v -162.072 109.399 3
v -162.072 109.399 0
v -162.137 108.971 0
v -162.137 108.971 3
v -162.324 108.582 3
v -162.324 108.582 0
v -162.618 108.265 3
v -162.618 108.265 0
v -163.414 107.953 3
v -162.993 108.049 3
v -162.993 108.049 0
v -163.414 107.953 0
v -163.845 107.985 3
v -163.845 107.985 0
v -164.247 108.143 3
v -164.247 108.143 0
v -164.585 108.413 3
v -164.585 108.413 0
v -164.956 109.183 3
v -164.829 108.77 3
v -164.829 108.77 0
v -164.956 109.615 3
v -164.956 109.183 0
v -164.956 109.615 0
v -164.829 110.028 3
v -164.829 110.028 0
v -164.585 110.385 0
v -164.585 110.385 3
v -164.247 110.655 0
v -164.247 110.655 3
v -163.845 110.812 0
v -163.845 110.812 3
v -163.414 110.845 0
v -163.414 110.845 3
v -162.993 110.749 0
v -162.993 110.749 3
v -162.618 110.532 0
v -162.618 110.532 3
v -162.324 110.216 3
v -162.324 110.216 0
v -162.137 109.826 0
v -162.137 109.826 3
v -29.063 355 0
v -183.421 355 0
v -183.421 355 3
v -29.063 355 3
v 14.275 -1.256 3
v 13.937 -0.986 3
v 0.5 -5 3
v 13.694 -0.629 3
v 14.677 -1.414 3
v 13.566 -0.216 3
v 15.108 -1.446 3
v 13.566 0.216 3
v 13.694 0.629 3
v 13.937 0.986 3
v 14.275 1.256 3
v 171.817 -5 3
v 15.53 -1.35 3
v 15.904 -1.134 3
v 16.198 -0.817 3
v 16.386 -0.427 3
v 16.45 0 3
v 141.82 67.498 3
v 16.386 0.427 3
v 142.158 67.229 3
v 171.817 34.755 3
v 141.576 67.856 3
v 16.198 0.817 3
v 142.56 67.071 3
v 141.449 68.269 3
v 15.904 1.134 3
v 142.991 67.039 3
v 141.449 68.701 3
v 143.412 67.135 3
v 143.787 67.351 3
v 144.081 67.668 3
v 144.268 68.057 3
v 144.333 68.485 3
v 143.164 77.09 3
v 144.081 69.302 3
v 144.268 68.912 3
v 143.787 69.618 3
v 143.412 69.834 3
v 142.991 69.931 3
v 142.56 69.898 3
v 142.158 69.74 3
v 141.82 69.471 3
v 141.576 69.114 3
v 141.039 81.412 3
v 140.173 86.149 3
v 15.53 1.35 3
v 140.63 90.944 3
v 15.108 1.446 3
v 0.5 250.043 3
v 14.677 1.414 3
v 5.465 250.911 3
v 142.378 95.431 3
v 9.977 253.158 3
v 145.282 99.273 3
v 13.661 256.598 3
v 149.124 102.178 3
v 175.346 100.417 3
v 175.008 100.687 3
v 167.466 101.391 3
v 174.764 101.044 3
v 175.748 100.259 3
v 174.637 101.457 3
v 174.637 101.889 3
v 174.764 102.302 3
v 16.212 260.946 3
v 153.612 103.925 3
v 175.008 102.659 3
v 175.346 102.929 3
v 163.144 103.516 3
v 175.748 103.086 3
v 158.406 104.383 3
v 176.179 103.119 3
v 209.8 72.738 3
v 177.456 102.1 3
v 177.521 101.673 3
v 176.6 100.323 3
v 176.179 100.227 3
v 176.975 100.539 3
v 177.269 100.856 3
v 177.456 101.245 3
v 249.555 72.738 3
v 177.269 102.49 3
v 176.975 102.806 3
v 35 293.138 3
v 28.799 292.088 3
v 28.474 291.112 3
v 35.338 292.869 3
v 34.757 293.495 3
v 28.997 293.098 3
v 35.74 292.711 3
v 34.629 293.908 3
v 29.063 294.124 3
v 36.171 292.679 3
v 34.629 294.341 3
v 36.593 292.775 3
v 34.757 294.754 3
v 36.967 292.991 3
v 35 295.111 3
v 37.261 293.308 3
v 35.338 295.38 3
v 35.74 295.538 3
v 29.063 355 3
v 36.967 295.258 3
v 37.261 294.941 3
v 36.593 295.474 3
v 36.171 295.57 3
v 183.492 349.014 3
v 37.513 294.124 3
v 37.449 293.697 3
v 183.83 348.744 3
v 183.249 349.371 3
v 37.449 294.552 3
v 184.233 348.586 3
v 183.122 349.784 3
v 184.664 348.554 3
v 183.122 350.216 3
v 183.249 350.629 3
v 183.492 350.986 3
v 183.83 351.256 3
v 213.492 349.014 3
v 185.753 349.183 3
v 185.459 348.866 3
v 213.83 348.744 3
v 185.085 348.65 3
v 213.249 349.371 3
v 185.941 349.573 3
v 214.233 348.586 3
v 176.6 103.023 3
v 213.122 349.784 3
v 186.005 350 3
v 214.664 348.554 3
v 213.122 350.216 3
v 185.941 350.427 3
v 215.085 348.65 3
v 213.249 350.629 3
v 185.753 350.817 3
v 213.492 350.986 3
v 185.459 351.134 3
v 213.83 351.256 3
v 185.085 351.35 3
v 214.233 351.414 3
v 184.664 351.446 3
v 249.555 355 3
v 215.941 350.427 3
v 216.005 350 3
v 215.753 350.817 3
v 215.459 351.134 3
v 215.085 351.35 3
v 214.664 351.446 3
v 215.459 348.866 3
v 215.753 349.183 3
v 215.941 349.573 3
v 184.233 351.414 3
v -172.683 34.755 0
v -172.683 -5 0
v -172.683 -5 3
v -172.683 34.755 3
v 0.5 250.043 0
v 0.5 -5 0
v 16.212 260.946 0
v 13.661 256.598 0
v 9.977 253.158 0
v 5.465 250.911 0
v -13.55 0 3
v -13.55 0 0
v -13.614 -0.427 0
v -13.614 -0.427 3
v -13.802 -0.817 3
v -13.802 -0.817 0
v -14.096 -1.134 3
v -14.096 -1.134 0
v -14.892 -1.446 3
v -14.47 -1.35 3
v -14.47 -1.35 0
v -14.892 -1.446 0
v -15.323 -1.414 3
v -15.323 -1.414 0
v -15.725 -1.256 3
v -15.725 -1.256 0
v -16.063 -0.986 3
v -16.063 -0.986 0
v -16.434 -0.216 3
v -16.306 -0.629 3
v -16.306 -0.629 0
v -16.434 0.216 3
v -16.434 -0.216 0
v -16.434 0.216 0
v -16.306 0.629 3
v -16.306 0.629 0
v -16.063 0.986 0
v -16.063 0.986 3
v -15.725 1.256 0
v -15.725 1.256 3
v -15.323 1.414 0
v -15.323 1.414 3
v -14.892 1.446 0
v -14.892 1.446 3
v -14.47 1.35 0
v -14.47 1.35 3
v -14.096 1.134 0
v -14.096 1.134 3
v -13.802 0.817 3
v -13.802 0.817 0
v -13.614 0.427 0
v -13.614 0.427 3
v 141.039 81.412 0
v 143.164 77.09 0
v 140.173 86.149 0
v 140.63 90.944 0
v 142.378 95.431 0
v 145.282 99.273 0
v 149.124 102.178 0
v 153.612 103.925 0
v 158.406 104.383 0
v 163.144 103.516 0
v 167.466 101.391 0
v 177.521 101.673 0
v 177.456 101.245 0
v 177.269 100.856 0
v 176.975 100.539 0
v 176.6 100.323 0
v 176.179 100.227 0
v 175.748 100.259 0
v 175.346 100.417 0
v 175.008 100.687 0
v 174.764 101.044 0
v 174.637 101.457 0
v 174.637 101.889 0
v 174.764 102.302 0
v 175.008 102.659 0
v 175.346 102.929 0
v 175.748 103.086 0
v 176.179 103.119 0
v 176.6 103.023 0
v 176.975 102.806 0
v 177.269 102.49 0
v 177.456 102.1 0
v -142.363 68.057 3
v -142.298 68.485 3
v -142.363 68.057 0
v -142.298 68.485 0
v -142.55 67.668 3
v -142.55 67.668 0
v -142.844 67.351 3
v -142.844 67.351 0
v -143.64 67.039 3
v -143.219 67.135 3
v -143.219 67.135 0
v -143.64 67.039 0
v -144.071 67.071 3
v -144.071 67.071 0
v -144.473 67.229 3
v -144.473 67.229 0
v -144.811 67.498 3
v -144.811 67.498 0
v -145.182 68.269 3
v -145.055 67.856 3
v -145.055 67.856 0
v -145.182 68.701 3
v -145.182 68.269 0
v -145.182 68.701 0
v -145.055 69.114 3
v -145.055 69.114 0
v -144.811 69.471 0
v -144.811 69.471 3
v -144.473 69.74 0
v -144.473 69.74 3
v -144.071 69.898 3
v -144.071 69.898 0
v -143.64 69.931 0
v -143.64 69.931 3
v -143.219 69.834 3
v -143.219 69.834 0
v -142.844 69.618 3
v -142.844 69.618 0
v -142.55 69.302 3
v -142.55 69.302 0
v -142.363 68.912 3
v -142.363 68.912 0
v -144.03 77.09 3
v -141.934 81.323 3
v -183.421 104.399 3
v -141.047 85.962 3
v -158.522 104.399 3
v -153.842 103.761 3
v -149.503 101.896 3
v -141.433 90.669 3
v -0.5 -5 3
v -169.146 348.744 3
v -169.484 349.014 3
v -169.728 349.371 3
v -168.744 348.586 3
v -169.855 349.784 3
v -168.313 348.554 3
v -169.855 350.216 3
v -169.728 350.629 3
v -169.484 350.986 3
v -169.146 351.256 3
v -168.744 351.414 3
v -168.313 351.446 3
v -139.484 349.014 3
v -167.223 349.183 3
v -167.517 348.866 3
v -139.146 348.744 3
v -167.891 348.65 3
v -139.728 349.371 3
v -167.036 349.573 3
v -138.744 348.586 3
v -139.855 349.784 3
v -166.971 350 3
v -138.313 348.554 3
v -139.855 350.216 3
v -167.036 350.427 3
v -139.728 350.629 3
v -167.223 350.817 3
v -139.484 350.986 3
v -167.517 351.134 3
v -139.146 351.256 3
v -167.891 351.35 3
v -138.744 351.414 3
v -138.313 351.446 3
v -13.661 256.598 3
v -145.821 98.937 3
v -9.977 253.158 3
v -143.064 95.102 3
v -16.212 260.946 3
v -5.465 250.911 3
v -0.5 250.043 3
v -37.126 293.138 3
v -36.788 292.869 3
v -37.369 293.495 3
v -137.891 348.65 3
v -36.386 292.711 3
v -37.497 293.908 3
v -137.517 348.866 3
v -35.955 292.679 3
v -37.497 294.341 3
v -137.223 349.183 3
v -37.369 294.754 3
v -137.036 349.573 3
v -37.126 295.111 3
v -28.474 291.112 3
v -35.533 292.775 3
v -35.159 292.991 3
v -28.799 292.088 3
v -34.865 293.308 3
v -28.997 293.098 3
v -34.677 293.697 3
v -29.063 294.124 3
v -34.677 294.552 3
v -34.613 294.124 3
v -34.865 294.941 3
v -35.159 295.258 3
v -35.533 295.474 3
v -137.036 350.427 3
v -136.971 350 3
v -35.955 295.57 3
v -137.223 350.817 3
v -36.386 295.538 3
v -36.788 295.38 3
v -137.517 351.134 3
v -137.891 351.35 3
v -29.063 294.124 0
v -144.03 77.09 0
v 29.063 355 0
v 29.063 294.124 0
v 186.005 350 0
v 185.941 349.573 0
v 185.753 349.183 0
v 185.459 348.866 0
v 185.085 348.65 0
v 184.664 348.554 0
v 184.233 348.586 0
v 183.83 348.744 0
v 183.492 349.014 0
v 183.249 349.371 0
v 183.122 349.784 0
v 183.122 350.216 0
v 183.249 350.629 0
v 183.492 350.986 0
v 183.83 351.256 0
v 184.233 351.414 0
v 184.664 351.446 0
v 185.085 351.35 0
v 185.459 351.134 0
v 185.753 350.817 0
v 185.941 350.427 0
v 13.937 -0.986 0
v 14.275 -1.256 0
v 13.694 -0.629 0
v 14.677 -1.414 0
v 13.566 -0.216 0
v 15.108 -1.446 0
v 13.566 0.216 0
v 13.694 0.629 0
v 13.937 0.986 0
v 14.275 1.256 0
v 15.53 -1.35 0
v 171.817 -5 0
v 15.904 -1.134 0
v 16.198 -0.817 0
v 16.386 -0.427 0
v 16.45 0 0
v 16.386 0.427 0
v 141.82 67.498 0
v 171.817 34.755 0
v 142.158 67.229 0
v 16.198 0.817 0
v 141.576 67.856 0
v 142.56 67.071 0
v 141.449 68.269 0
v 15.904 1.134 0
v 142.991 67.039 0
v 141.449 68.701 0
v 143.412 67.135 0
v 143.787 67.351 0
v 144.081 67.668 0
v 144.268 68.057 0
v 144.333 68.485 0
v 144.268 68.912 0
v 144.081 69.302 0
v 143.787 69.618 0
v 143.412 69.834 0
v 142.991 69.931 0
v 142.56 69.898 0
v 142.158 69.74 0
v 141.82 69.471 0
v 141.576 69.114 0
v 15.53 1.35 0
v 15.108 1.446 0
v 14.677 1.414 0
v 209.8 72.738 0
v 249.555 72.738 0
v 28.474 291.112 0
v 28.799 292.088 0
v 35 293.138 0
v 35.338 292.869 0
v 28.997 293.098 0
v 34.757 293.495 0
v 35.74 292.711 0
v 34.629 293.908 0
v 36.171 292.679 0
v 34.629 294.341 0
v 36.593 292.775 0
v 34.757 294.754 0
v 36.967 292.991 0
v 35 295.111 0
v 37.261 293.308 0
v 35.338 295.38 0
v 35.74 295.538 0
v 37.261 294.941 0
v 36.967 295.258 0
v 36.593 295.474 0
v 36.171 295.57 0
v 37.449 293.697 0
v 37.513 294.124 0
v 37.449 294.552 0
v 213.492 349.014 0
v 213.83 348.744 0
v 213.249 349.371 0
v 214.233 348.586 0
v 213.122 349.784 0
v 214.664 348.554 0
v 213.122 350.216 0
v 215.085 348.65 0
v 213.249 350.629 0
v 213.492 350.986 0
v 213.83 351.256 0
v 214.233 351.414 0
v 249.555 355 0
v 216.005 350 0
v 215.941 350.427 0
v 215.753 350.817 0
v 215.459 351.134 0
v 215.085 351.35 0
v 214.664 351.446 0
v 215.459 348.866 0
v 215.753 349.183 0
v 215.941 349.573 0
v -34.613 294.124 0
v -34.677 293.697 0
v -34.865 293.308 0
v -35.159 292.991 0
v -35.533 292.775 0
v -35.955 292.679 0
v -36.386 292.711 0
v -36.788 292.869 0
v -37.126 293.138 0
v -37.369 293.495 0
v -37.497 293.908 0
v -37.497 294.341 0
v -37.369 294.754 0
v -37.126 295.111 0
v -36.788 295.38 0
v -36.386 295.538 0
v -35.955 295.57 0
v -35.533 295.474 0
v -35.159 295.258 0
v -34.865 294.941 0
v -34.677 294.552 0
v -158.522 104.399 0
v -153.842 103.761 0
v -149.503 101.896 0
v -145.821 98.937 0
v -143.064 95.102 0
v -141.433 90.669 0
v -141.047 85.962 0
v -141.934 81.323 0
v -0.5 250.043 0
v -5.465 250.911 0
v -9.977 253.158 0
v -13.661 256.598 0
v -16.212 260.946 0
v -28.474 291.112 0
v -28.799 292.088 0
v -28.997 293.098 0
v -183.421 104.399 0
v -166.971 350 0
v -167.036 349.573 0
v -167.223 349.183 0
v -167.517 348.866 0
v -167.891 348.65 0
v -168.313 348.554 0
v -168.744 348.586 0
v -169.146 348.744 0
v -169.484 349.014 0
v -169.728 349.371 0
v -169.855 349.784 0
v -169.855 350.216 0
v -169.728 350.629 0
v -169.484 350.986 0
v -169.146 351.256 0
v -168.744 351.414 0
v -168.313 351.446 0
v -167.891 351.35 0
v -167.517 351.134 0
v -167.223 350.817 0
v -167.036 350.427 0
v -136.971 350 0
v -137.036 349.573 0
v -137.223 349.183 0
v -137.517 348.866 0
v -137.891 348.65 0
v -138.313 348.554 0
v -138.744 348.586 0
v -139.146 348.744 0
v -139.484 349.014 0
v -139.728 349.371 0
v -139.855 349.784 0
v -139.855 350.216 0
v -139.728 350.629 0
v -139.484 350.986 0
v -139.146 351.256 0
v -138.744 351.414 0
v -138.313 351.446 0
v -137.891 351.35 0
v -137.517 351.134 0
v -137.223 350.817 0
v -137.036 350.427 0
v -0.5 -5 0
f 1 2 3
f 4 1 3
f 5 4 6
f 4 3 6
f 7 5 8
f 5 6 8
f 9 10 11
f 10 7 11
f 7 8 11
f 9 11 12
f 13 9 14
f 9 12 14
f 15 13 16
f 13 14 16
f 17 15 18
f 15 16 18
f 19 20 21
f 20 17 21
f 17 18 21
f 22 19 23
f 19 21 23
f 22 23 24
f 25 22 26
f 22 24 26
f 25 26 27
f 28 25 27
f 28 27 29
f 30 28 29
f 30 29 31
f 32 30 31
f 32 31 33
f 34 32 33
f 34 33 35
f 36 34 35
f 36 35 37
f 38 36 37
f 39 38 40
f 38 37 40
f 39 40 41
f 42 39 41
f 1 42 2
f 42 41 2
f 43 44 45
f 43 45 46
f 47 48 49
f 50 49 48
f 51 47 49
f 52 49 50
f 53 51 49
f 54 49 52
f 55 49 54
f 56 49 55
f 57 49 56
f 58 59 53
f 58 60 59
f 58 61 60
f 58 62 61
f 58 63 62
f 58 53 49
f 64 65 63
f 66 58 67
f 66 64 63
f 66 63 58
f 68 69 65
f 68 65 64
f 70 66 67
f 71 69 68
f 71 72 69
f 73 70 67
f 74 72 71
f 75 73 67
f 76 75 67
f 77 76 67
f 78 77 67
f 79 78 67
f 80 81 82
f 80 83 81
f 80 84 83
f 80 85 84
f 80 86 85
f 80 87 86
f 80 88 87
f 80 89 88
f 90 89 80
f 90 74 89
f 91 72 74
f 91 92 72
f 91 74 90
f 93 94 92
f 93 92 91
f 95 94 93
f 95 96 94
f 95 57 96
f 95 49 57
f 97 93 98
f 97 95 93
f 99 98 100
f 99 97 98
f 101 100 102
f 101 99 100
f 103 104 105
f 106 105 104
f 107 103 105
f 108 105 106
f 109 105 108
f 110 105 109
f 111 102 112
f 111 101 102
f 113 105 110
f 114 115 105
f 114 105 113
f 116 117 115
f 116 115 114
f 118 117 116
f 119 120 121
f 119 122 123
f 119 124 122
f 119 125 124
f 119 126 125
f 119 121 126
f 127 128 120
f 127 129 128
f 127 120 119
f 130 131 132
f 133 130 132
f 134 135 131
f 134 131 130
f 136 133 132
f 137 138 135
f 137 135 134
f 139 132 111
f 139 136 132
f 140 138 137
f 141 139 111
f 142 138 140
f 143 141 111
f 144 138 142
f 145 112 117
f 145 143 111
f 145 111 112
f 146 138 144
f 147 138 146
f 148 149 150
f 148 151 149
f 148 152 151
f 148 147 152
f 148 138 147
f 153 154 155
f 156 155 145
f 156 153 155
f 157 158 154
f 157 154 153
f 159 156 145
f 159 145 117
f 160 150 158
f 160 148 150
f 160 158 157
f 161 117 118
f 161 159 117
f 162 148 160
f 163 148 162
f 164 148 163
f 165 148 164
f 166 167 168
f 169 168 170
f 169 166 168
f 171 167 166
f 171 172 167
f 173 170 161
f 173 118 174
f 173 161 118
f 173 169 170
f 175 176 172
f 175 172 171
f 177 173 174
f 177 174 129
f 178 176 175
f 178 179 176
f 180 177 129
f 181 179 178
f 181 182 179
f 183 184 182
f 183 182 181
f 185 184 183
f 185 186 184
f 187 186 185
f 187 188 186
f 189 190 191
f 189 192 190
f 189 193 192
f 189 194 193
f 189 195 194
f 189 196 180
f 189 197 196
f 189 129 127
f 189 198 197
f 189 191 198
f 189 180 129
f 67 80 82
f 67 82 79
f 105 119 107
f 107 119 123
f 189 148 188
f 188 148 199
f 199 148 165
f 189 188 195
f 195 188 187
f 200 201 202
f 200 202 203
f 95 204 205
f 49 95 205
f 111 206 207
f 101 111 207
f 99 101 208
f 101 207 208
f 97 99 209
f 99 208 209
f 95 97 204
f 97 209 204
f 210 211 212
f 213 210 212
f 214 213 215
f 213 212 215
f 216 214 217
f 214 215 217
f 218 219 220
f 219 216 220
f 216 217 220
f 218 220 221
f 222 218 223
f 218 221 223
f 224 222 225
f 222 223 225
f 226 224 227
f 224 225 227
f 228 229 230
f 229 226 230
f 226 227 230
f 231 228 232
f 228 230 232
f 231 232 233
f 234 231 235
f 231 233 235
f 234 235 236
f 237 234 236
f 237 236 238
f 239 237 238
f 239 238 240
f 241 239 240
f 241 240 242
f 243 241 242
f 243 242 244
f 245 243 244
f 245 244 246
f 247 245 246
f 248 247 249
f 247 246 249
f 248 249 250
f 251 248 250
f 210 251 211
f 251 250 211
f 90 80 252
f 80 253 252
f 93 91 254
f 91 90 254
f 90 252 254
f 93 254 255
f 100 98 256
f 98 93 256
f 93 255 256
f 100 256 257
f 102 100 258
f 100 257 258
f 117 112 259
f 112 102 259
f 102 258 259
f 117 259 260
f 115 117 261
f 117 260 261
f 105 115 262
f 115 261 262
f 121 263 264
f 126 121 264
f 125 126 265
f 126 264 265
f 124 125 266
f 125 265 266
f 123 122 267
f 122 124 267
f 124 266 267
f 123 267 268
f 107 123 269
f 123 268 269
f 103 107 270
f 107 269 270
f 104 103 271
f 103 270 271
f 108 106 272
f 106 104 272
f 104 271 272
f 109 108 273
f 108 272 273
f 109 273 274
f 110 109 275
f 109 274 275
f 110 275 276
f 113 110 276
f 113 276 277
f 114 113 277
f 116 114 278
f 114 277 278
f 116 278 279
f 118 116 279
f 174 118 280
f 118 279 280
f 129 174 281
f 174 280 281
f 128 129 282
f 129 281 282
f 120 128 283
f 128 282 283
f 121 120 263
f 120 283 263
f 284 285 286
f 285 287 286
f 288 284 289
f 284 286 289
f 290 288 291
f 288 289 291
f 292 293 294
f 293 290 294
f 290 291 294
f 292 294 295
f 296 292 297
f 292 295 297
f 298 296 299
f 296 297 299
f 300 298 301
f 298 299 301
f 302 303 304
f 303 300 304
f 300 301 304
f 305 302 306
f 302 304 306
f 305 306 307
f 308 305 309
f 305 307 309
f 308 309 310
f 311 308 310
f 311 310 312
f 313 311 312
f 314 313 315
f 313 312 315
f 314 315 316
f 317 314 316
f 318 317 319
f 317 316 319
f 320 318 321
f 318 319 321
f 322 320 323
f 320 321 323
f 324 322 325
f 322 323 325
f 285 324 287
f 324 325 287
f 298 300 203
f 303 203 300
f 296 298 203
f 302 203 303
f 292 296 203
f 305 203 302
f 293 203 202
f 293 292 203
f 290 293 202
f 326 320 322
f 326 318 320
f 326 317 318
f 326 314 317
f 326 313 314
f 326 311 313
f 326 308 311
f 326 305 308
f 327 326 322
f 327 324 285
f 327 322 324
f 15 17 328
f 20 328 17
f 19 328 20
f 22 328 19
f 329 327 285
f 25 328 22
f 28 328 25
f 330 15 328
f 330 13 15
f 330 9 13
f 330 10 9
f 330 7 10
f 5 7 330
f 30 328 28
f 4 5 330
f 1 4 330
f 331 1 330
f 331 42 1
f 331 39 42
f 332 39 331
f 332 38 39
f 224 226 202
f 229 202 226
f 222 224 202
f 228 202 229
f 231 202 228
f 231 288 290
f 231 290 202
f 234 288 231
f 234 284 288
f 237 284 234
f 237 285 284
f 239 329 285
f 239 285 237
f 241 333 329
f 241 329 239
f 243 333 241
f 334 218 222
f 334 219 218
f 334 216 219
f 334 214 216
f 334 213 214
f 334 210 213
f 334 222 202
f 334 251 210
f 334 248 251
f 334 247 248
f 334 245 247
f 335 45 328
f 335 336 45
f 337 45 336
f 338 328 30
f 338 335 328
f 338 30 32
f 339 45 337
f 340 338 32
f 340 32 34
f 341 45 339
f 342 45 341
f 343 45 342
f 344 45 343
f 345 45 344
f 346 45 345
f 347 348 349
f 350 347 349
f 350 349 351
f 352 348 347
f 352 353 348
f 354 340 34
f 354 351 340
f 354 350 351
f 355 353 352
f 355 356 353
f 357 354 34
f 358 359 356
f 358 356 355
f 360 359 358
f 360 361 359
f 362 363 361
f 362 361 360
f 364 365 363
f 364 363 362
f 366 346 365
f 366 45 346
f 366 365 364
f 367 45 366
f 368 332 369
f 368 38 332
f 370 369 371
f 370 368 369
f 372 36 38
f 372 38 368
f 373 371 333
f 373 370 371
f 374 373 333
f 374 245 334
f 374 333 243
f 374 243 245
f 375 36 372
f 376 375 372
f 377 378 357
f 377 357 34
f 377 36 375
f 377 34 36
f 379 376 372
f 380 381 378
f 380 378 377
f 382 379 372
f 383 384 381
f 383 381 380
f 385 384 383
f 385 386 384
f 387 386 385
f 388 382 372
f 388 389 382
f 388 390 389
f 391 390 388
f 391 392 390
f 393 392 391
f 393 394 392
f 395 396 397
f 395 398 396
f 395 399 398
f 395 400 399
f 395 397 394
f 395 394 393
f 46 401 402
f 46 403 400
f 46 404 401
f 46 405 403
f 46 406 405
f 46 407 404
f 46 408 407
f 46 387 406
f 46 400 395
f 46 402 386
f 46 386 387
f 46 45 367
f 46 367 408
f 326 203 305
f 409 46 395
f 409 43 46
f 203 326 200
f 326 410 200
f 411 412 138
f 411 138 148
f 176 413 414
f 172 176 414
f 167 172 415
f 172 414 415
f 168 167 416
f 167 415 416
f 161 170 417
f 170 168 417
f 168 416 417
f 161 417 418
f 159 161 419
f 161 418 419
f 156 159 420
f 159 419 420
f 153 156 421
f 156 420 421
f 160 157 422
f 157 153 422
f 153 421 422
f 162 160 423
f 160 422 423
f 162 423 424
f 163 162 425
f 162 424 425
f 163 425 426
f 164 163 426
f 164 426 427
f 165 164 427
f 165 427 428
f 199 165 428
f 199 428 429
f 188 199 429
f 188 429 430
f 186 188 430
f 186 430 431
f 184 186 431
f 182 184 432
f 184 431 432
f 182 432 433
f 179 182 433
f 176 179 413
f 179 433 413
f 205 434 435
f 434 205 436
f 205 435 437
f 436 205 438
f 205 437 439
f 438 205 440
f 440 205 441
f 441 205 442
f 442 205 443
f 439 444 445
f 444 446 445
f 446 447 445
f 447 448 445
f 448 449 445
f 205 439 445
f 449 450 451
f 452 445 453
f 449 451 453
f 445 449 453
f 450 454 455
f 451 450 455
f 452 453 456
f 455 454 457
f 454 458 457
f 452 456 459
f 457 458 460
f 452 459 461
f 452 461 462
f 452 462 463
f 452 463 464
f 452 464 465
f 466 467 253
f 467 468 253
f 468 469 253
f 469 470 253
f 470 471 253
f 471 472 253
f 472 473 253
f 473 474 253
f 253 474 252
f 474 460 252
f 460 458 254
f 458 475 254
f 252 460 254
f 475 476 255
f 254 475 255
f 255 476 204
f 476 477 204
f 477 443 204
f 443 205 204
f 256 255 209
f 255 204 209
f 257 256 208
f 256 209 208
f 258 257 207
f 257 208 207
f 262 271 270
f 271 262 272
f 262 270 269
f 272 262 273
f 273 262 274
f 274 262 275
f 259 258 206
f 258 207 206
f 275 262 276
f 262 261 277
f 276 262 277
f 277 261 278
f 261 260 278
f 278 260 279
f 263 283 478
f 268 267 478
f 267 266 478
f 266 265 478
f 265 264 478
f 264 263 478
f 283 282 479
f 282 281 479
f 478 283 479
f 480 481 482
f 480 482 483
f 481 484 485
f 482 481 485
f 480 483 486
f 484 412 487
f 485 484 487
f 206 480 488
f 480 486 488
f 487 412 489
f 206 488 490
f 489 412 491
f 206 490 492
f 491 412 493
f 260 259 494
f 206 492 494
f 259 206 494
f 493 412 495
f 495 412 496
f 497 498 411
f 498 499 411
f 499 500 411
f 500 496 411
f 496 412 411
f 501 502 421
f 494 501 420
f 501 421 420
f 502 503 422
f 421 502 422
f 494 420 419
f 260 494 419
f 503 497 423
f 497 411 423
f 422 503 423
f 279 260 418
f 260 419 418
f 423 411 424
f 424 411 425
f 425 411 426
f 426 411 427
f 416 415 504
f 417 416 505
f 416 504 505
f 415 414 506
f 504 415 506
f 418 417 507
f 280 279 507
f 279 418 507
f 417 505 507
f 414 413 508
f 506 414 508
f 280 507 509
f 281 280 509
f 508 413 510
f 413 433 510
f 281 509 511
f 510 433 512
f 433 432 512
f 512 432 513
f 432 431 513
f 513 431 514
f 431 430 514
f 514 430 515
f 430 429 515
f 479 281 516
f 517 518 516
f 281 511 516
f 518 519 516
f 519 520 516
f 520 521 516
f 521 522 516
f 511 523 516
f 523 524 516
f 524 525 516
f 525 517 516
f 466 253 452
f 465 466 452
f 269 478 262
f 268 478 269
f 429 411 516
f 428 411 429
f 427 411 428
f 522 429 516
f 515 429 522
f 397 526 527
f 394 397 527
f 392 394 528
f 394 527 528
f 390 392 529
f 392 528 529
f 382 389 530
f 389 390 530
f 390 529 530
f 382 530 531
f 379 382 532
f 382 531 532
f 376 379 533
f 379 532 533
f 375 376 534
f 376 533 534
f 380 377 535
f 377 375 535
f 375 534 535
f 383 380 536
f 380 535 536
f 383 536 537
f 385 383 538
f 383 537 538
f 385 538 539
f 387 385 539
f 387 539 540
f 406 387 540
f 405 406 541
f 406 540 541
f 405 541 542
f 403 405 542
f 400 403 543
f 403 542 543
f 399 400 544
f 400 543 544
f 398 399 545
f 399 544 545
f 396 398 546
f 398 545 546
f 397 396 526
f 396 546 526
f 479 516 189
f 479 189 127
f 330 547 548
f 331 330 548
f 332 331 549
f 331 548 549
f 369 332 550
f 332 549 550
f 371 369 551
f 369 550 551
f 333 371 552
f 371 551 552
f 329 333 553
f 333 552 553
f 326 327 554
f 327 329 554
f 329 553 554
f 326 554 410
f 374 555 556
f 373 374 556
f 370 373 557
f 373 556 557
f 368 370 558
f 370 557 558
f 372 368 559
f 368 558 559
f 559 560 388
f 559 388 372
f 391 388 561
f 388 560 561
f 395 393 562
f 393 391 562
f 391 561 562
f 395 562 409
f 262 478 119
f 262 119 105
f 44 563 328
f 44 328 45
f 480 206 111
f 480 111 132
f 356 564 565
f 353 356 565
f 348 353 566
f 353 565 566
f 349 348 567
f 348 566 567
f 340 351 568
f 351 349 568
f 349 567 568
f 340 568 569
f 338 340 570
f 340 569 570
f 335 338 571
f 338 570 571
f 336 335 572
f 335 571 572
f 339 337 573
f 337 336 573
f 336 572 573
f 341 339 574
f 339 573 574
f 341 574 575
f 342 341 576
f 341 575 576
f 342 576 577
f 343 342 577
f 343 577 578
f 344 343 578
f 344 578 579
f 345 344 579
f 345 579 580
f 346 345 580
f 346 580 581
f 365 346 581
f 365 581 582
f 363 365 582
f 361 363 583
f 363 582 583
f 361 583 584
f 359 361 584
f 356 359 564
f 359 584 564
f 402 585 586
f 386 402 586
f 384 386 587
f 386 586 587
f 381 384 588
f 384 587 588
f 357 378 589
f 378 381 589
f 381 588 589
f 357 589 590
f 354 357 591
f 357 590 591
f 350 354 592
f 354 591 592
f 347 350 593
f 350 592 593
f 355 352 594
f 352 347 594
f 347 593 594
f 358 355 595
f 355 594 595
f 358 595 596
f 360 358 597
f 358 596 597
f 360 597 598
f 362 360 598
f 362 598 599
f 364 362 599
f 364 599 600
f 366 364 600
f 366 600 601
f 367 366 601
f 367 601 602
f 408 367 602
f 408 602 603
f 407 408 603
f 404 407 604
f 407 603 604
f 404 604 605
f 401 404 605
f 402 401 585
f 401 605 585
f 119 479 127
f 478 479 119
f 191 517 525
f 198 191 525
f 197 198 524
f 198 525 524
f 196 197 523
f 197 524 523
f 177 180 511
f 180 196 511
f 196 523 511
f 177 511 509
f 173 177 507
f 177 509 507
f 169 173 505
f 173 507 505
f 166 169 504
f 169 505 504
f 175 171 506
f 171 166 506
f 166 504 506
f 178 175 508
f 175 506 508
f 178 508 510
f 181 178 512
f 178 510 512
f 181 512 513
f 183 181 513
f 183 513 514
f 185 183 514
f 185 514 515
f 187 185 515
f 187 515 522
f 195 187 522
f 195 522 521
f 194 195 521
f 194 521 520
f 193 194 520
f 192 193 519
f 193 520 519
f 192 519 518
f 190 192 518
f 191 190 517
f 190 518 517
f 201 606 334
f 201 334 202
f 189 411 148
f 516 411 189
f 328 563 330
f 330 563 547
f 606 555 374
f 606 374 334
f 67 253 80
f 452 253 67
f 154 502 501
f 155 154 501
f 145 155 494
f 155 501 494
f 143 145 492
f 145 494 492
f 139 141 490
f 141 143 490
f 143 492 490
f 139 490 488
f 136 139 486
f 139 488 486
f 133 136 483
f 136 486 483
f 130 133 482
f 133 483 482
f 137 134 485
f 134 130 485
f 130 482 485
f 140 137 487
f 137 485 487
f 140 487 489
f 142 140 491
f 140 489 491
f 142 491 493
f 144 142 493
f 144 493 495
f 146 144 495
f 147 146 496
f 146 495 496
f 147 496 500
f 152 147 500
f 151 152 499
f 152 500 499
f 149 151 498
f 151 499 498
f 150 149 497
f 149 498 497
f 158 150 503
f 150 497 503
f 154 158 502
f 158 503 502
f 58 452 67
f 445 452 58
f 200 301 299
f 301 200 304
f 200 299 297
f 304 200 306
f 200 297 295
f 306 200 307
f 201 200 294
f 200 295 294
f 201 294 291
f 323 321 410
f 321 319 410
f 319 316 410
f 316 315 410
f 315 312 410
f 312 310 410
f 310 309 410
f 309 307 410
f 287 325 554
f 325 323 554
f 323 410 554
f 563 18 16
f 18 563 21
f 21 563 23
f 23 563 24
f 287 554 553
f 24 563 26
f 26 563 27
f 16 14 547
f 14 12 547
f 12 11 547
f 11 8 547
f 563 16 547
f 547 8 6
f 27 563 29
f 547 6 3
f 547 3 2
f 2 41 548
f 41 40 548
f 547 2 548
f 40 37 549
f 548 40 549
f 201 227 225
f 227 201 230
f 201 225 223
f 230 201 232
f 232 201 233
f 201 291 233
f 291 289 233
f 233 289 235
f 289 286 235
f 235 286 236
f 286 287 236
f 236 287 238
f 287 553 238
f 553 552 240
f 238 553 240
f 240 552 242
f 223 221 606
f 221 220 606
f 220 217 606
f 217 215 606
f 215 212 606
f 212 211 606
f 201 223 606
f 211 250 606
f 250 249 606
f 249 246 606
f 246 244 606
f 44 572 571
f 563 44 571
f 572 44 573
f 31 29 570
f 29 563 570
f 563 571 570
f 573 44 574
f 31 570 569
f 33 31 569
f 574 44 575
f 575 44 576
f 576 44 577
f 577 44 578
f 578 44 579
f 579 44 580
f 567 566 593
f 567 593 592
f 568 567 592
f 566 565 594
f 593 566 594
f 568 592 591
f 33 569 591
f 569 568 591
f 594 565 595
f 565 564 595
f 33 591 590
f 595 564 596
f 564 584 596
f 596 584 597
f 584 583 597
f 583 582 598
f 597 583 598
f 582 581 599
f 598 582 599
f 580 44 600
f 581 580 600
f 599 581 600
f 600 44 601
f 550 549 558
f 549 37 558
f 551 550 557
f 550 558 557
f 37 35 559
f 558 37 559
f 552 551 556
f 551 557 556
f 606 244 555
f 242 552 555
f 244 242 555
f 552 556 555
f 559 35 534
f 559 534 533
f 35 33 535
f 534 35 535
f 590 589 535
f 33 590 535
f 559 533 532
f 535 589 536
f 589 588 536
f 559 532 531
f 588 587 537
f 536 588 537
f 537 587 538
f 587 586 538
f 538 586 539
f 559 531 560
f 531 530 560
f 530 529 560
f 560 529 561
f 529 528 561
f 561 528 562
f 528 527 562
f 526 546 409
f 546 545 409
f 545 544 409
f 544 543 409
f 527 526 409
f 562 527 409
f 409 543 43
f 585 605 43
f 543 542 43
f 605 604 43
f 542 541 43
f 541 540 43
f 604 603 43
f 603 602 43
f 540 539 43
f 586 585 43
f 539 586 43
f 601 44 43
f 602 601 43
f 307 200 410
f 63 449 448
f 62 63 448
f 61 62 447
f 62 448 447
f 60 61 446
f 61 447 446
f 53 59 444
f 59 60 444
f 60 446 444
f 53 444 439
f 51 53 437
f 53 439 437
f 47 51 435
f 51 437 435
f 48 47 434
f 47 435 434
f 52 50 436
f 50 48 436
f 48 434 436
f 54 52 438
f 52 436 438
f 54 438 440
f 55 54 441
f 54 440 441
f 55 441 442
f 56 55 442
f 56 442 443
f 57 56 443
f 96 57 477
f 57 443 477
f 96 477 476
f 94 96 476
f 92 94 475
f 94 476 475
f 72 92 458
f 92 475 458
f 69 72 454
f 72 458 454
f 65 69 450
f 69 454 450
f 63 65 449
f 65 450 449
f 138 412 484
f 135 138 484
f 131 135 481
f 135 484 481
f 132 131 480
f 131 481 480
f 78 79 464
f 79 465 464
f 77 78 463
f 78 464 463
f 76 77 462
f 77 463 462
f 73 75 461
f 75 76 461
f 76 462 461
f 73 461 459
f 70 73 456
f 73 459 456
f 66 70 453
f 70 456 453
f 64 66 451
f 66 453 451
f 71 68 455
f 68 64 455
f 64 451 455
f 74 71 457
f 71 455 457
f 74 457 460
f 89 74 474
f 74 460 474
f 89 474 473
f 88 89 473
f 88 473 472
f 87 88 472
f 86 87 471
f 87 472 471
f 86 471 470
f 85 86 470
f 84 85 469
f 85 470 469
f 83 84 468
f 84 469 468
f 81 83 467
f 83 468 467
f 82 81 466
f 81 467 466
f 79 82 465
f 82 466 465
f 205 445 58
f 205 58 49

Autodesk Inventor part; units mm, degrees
ref_plane "YZ Plane" through (0, 0, 0) normal (1, 0, 0) x (0, 1, 0)
ref_plane "XZ Plane" through (0, 0, 0) normal (0, 1, 0) x (-1, 0, 0)
ref_plane "XY Plane" through (0, 0, 0) normal (0, 0, 1) x (1, 0, 0)
sketch "Sketch13" plane through (0, 0, 0) normal (0, 0, 1) x (1, 0, 0)
  line L0 (-25, -5) -> (-25, 5) projected
  line L1 (25, -5) -> (-25, -5) projected
  line L2 (25, 5) -> (25, -5) projected
  line L3 (-25, 5) -> (25, 5) projected
  line L4 (143.1641, 77.0898) -> (171.8171, 34.7554) projected
  arc A0 (167.4656, 101.3913) -> (143.1641, 77.0898) centre (157.6566, 86.8988) ccw projected
  line L5 (209.8, 72.7382) -> (167.4656, 101.3913) projected
  line L6 (227.0605, 72.7382) -> (209.8, 72.7382) projected
  arc A1 (227.0605, 72.7382) -> (224.4218, 74.9169) centre (214.3326, 60.0103) ccw projected
  line L7 (173.0707, 109.6728) -> (224.4218, 74.9169) projected
  arc A2 (173.0707, 109.6728) -> (134.8826, 71.4847) centre (157.6566, 86.8988) ccw projected
  line L8 (169.6384, 20.1336) -> (134.8826, 71.4847) projected
  arc A3 (169.6384, 20.1336) -> (171.8171, 17.4949) centre (184.5451, 30.2228) ccw projected
  line L9 (171.8171, 34.7554) -> (171.8171, 17.4949) projected
  line L10 (224.5554, 355) -> (224.5554, 345) projected
  line L11 (174.5554, 355) -> (224.5554, 355) projected
  line L12 (174.5554, 345) -> (174.5554, 355) projected
  line L13 (224.5554, 345) -> (174.5554, 345) projected
  line L14 (16.2119, 260.9456) -> (28.4741, 291.112) projected
  arc A4 (-16.2118, 260.9456) -> (16.2119, 260.9456) centre (0.0001, 267.5355) ccw projected
  line L15 (-28.474, 291.112) -> (-16.2118, 260.9456) projected
  arc A5 (-29.0629, 294.1245) -> (-28.474, 291.112) centre (-21.0629, 294.1245) ccw projected
  line L16 (-29.0629, 355) -> (-29.0629, 294.1245) projected
  line L17 (-41.0629, 355) -> (-29.0629, 355) projected
  line L18 (-41.0629, 294.1245) -> (-41.0629, 355) projected
  arc A6 (-41.0629, 294.1245) -> (-39.5907, 286.5932) centre (-21.0629, 294.1245) ccw projected
  line L19 (-27.3284, 256.4268) -> (-39.5907, 286.5932) projected
  arc A7 (-27.3284, 256.4268) -> (27.3286, 256.4268) centre (0.0001, 267.5355) ccw projected
  line L20 (39.5908, 286.5932) -> (27.3286, 256.4268) projected
  arc A8 (39.5908, 286.5932) -> (41.063, 294.1245) centre (21.063, 294.1245) ccw projected
  line L21 (41.063, 355) -> (41.063, 294.1245) projected
  line L22 (29.063, 355) -> (41.063, 355) projected
  line L23 (29.063, 294.1245) -> (29.063, 355) projected
  arc A9 (28.4741, 291.112) -> (29.063, 294.1245) centre (21.063, 294.1245) ccw projected
  line L24 (-128.4211, 355) -> (-128.4211, 345) projected
  line L25 (-178.4211, 355) -> (-128.4211, 355) projected
  line L26 (-178.4211, 345) -> (-178.4211, 355) projected
  line L27 (-128.4211, 345) -> (-178.4211, 345) projected
  line L28 (-183.4211, 104.3988) -> (-158.5223, 104.3988) projected
  arc A10 (-144.0298, 77.0898) -> (-158.5223, 104.3988) centre (-158.5223, 86.8988) ccw projected
  line L29 (-144.0298, 77.0898) -> (-172.6829, 34.7554) projected
  line L30 (-172.6829, 34.7554) -> (-172.6829, 17.4949) projected
  arc A11 (-172.6829, 17.4949) -> (-170.5041, 20.1336) centre (-185.4108, 30.2228) ccw projected
  line L31 (-170.5041, 20.1336) -> (-135.7483, 71.4847) projected
  arc A12 (-135.7483, 71.4847) -> (-158.5223, 114.3988) centre (-158.5223, 86.8988) ccw projected
  line L32 (-158.5223, 114.3988) -> (-183.4211, 114.3988) projected
  line L33 (-183.4211, 114.3988) -> (-183.4211, 104.3988) projected
  line L34 (-183.4211, 114.3988) -> (-183.4211, 355)
  line L35 (-183.4211, 355) -> (-178.4211, 355)
  line L36 (-128.4211, 355) -> (-41.0629, 355)
  line L37 (41.063, 355) -> (174.5554, 355)
  line L38 (224.5554, 355) -> (249.5554, 355)
  line L39 (249.5554, 355) -> (249.5554, 72.7382)
  line L40 (249.5554, 72.7382) -> (227.0605, 72.7382)
  line L41 (264.5554, -5) -> (264.5554, 355) projected
  line L42 (-25, -5) -> (-172.6829, -5)
  line L43 (-172.6829, -5) -> (-172.6829, 17.4949)
  line L44 (171.8171, 17.4949) -> (171.8171, -5)
  line L45 (171.8171, -5) -> (25, -5)
  line L46 (0.5001, 250.0427) -> (0.5001, -5)
  line L47 (-0.4999, 250.0427) -> (-0.4999, -5)
  line L48 (-265.4446, 355) -> (-265.4446, -5) projected
  line L49 (-250.4446, 325) -> (-250.4446, 355)
  line L50 (-250.4446, 355) -> (-183.4211, 355)
  line L51 (-250.4446, 325) -> (-183.4211, 325)
  circle A13 centre (142.8826, 68.4847) radius 1.45 projected
  circle A14 centre (176.0707, 101.6728) radius 1.45 projected
  circle A15 centre (-143.7483, 68.4847) radius 1.45 projected
  circle A16 centre (-163.5223, 109.3988) radius 1.45 projected
  circle A17 centre (-36.0629, 294.1245) radius 1.45 projected
  circle A18 centre (36.063, 294.1245) radius 1.45 projected
  circle A19 centre (-138.4211, 350) radius 1.45 projected
  circle A20 centre (-168.4211, 350) radius 1.45 projected
  circle A21 centre (214.5554, 350) radius 1.45 projected
  circle A22 centre (184.5554, 350) radius 1.45 projected
  circle A23 centre (-15, 0) radius 1.45 projected
  circle A24 centre (15, 0) radius 1.45 projected
  point P0 (0, 0)
  dimension "d27" = 15
  dimension "d28" = 1
  dimension "d31" = 15
  dimension "d32" = 30
extrude "Extrusion14" add sketch "Sketch13" along normal blind 3 contours L42 L43 A11 L31 A12 L32 L34 L35 L26 L27 L24 L36 L18 A6 L19 A7 L47 L3 L0 | L0 L3 L47 L1 | L46 L3 L2 L1 | L30 L29 A10 L28 L33 L32 A12 L31 A11 | L46 A7 L20 A8 L21 L37 L12 L13 L10 L38 L39 L40 A1 L7 A2 L8 A3 L44 L45 L2 L3 | A7 L19 A6 L18 L17 L16 A5 L15 A4 L47 | L46 A4 L14 A9 L23 L22 L21 A8 L20 A7 | A3 L8 A2 L7 A1 L6 L5 A0 L4 L9 | L24 L27 L26 L25 | L11 L10 L13 L12
sketch "Sketch14" plane through (0, 0, 3) normal (0, 0, 1) x (1, 0, 0)
  line L0 (-0.4999, -5) -> (-0.4999, 250.0427) projected
  line L1 (-0.4999, -5) -> (-0.4999, 250.0427) projected
  line L2 (0.5001, 250.0427) -> (0.5001, -5) projected
  line L3 (-0.4999, 9.145) -> (0.5001, 9.145)
  line L4 (0.5001, 9.145) -> (0.5001, 12.145)
  line L5 (0.5001, 12.145) -> (-0.4999, 12.145)
  line L6 (-0.4999, 12.145) -> (-0.4999, 9.145)
  line L7 (-0.4999, 237.7207) -> (0.5001, 237.7207)
  line L8 (0.5001, 237.7207) -> (0.5001, 234.7207)
  line L9 (0.5001, 234.7207) -> (-0.4999, 234.7207)
  line L10 (-0.4999, 234.7207) -> (-0.4999, 237.7207)
  point P0 (0, 0)
  point P1 (-0.4999, 234.7207)
  dimension "d33" = 3
  dimension "d34" = 3
properties part number "Electronics Cover Panel" material "Aluminum 6061"
